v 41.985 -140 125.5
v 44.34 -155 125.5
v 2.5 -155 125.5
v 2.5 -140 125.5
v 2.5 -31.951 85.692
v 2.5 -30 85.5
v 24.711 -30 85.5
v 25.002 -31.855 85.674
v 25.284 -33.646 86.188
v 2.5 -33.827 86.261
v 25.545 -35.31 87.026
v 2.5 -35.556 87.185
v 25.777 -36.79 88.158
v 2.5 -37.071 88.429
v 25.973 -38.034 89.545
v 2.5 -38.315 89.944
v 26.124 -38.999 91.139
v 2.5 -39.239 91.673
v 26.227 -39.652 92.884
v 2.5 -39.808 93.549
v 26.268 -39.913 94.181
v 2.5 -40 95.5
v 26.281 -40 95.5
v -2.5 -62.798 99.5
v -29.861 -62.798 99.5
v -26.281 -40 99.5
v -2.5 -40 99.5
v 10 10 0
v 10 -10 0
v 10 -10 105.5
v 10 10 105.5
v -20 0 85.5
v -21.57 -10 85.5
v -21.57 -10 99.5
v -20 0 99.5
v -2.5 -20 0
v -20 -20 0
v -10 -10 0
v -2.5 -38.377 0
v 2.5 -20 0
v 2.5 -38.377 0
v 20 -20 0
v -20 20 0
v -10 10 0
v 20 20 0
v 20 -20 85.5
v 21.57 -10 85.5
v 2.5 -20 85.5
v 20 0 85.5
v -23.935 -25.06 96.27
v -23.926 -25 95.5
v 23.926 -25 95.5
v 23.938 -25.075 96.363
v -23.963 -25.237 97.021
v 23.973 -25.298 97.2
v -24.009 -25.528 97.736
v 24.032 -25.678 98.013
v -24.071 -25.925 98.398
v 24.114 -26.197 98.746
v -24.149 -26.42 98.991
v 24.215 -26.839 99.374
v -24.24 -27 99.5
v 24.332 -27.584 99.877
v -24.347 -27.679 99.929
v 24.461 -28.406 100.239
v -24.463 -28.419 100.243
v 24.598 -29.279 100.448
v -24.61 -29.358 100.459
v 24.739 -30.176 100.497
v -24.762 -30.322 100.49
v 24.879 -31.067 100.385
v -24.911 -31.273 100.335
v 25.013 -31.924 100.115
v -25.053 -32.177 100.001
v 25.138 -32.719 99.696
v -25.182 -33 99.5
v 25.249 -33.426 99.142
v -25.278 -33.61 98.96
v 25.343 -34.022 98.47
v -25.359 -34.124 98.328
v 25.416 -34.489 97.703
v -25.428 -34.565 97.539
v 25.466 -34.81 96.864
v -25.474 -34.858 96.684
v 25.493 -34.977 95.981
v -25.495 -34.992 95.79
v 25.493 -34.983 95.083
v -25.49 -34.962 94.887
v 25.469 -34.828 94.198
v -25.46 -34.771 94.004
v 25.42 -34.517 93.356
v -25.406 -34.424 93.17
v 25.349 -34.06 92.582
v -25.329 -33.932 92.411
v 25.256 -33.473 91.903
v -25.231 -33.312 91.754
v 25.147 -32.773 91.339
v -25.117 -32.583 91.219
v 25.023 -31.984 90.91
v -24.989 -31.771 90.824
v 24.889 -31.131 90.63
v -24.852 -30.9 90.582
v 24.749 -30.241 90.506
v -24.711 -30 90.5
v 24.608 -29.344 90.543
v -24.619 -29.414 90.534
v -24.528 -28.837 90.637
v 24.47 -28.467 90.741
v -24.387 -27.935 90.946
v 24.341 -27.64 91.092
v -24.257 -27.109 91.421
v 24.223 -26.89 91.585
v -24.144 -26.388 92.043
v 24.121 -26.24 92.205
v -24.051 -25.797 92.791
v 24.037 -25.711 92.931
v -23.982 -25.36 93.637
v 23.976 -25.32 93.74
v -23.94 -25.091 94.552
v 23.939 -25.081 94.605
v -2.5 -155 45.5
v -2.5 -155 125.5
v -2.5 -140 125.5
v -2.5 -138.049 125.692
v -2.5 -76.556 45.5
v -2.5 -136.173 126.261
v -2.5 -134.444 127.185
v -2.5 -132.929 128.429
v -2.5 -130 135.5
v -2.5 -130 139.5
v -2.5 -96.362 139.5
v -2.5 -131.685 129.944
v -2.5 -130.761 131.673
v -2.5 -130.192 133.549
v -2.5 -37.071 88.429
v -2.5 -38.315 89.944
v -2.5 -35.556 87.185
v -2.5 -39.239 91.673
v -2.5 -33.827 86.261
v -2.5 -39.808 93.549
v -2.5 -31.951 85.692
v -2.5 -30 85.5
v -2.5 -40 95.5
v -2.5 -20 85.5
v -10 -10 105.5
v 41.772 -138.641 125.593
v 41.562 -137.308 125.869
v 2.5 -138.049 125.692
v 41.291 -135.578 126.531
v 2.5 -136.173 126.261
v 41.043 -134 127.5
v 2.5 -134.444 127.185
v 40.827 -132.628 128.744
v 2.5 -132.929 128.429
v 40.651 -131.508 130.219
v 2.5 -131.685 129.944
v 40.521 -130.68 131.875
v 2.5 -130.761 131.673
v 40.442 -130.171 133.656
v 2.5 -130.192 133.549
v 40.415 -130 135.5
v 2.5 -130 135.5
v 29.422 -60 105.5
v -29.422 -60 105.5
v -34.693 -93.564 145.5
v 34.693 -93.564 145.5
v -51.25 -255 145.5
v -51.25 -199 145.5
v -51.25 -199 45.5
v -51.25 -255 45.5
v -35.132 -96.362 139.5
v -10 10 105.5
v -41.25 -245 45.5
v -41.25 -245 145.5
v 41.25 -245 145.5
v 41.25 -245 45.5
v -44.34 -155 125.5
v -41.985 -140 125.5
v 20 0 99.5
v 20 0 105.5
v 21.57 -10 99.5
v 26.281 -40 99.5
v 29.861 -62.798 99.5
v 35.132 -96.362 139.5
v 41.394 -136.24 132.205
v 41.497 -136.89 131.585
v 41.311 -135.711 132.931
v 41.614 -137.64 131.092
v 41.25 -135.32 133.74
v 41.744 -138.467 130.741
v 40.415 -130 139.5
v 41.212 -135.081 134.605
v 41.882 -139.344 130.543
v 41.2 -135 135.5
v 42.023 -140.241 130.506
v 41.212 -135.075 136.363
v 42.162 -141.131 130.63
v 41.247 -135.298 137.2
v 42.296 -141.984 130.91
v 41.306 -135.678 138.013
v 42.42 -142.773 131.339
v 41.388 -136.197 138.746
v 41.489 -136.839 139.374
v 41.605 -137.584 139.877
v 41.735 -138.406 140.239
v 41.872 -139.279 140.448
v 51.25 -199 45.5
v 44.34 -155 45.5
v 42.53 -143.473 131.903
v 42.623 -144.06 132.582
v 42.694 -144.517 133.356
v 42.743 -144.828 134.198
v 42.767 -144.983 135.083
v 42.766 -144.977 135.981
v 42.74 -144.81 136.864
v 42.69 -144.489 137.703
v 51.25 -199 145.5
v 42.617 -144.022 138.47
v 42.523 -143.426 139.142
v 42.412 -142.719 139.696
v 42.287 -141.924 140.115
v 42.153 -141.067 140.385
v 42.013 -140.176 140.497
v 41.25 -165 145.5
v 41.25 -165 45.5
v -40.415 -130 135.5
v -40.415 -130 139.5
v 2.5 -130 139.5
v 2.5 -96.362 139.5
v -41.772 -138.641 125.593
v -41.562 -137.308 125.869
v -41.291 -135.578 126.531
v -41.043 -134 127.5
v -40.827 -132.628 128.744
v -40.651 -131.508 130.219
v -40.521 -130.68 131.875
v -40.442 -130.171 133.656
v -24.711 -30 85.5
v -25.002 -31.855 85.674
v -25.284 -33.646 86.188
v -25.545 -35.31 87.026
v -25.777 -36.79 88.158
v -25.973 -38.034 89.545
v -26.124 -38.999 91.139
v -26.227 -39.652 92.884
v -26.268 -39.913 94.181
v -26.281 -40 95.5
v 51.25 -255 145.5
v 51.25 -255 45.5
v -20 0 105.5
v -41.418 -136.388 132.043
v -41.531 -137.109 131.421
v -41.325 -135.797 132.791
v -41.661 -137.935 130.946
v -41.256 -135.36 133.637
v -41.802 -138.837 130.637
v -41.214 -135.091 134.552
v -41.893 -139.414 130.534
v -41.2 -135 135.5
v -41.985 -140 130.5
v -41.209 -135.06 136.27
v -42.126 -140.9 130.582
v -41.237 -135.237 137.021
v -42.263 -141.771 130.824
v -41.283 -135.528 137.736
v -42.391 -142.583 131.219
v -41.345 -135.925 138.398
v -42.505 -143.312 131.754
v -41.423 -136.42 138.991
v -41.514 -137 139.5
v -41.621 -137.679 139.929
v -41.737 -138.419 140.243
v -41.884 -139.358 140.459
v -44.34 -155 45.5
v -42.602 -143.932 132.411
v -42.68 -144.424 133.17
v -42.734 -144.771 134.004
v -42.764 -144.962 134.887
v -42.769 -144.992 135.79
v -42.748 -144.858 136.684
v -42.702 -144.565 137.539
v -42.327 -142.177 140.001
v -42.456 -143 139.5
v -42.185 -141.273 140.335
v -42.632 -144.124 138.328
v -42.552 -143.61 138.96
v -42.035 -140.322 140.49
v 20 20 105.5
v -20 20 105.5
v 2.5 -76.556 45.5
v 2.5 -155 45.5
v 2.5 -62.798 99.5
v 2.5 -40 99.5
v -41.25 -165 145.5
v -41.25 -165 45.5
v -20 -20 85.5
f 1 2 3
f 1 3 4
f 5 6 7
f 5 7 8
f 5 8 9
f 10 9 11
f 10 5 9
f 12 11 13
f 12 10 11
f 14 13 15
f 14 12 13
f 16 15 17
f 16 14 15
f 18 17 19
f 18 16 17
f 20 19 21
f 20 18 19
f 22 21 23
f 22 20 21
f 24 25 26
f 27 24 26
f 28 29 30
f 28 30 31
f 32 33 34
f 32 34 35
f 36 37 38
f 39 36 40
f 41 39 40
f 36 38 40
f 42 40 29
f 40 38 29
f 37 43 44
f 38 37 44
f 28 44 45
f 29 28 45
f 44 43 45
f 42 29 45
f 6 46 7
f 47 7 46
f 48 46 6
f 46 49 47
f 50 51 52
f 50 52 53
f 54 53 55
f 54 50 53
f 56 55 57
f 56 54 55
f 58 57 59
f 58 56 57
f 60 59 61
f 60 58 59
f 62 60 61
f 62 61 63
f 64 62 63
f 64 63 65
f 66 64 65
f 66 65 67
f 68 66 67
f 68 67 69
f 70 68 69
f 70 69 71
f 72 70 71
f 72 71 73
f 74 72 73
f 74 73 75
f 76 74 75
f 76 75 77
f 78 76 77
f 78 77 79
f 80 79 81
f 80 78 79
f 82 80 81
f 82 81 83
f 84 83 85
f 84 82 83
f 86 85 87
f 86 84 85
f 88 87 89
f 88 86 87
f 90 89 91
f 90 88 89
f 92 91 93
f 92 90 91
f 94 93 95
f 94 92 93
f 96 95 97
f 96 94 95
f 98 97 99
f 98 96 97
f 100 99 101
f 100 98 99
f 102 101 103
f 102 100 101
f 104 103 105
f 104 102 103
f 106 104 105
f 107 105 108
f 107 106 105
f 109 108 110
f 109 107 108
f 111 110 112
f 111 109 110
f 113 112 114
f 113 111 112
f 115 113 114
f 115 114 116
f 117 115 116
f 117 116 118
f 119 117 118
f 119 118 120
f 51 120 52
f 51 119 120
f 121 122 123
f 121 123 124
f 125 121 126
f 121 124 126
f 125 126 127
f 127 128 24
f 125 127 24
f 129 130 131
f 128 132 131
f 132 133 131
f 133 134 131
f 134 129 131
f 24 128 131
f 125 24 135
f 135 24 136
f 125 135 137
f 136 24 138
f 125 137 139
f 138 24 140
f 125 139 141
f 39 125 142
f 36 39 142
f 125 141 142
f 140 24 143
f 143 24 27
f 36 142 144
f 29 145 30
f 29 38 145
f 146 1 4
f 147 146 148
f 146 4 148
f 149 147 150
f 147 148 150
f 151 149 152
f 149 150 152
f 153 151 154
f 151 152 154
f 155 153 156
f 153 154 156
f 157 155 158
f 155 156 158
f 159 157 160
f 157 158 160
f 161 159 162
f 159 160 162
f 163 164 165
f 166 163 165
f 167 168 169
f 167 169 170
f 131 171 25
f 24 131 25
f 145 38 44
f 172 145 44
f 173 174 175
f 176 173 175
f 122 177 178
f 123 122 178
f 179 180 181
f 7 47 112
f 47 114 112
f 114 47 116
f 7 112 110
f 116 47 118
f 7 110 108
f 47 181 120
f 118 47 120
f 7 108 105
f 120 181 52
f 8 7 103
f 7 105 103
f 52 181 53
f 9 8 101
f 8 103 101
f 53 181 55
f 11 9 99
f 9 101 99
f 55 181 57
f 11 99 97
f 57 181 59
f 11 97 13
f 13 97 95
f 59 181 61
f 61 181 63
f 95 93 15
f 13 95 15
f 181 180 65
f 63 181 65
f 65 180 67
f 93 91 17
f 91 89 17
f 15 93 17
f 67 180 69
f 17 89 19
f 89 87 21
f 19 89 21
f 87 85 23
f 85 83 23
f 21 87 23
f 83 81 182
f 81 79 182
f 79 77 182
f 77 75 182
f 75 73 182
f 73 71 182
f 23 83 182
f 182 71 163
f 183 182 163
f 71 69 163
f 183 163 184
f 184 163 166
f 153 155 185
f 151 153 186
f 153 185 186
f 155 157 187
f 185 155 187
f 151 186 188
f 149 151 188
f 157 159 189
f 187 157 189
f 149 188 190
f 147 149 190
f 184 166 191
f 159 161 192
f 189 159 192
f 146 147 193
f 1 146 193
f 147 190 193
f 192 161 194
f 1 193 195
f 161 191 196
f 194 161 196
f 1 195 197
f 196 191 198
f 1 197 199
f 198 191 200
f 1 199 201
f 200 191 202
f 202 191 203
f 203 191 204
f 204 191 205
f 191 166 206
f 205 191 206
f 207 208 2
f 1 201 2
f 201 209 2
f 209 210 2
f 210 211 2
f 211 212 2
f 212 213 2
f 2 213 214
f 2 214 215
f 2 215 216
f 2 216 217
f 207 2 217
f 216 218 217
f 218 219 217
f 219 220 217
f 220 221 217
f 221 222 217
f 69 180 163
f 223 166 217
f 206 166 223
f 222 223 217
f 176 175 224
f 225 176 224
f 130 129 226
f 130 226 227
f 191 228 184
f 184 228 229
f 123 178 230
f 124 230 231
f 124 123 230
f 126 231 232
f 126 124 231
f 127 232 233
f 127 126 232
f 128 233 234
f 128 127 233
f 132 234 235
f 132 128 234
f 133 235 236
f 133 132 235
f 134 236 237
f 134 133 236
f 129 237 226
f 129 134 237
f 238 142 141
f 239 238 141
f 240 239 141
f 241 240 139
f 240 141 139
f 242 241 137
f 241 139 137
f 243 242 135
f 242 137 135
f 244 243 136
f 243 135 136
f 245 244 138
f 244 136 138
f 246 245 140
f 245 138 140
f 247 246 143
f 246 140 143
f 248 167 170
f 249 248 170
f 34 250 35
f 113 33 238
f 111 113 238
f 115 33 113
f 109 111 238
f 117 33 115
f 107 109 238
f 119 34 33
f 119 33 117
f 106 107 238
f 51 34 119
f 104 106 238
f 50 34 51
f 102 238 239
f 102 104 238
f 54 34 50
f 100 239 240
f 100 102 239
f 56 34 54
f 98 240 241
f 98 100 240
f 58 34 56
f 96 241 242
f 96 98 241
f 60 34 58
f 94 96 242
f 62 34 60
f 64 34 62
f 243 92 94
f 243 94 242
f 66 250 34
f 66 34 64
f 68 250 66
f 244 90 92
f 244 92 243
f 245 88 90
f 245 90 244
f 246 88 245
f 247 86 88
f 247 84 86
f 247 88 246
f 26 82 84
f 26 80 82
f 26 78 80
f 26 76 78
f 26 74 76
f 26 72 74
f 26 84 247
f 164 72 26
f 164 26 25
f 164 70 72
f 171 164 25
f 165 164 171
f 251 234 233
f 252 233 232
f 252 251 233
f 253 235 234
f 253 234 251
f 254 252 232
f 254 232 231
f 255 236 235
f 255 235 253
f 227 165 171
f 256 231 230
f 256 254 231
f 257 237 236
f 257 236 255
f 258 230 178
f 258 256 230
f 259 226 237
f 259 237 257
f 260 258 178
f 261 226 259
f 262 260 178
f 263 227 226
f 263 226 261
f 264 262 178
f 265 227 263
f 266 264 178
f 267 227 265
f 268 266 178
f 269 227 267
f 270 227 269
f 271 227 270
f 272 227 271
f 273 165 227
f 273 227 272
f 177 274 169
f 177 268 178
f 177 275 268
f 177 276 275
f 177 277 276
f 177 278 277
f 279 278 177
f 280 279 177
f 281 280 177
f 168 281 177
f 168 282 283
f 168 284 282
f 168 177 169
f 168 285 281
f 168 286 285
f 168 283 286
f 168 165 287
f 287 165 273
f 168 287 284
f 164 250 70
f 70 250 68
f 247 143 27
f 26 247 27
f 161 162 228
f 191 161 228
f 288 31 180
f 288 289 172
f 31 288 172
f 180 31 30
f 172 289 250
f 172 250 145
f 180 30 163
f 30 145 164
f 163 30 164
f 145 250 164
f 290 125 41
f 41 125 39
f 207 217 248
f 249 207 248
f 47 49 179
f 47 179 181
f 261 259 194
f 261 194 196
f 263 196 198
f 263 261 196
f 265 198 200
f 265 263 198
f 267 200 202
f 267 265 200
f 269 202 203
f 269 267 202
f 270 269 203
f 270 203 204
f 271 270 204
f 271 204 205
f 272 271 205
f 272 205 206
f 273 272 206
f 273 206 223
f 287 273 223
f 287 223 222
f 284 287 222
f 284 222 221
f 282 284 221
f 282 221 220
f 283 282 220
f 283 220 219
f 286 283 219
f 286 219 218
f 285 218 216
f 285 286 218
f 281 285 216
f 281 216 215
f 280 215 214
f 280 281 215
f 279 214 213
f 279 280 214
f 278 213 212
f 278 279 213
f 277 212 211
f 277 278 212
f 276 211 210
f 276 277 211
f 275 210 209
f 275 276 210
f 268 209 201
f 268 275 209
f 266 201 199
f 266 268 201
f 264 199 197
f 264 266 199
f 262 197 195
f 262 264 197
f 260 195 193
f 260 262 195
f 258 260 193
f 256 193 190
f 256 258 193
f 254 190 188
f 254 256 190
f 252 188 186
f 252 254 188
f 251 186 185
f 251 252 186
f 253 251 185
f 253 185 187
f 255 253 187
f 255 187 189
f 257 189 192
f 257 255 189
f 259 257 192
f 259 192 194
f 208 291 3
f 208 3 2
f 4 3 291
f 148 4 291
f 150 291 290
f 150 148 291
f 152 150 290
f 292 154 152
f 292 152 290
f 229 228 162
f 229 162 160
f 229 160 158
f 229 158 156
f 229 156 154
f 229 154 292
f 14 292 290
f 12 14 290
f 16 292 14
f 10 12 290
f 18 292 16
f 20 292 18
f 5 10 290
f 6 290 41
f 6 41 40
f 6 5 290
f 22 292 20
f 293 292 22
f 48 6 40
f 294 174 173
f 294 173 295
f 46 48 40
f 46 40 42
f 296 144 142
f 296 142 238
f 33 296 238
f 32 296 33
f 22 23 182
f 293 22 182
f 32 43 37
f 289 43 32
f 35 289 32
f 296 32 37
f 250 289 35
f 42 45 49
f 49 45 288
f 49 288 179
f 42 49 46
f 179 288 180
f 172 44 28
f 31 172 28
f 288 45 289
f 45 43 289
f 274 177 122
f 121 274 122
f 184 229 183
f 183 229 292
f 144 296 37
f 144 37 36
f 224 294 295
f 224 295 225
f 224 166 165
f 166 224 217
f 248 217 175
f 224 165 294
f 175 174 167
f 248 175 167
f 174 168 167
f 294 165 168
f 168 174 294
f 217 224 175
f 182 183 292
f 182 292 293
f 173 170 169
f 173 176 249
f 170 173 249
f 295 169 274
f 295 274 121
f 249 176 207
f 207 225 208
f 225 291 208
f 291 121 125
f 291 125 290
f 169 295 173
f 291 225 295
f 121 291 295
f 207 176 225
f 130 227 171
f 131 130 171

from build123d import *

# Parameters (mm, degrees)
SKETCH1_W                = 40
SKETCH1_H                = 40
SKETCH1_W_2              = 20
SKETCH1_H_2              = 20
BOSS_EXTRUDE1_DEPTH      = 105.5
SKETCH2_W                = 102.5
SKETCH2_H                = 100
SKETCH2_W_2              = 82.5
SKETCH2_H_2              = 80
BOSS_EXTRUDE2_DEPTH      = 100
EXTRUDE_THIN1_DEPTH      = 158
EXTRUDE_THIN1_DEPTH_BACK = 166
RIB8_START               = -2.5
RIB8_DEPTH               = 5
CUT_EXTRUDE2_DEPTH       = 338.270292199
SKETCH2_2_W              = 82.5
SKETCH2_2_H              = 80
CUT_EXTRUDE3_DEPTH       = 299.029885246
SKETCH1_2_W              = 20
SKETCH1_2_H              = 20
CUT_EXTRUDE4_DEPTH       = 299.029885246
BOSS_EXTRUDE3_REACH      = 300.03
SKETCH7_R                = 5
BOSS_EXTRUDE4_REACH      = 300.03
CUT_EXTRUDE6_DEPTH       = 299.029885246
CUT_EXTRUDE6_DEPTH_BACK  = 299.029885246
SKETCH7_4_R              = 5
BOSS_EXTRUDE5_DEPTH      = 14


# Read off the part's stored shape, not the designer's step: Rib8
with BuildPart() as part:
    # Sketch1 → Boss-Extrude1 (new body)
    with BuildSketch(Plane.XY):
        Rectangle(SKETCH1_W, SKETCH1_H)
        Rectangle(SKETCH1_W_2, SKETCH1_H_2, mode=Mode.SUBTRACT)
    extrude(amount=BOSS_EXTRUDE1_DEPTH)



with BuildPart() as body_2:
    # Sketch2 → Boss-Extrude2 (new body)
    with BuildSketch(Plane.XY.offset(145.5)):
        with Locations((0, -205)):
            Rectangle(SKETCH2_W, SKETCH2_H)
        with Locations((0, -205)):
            Rectangle(SKETCH2_W_2, SKETCH2_H_2, mode=Mode.SUBTRACT)
    extrude(amount=-BOSS_EXTRUDE2_DEPTH)


with BuildPart() as part_1:
    add(part.part)

    add(body_2.part)  # Extrude-Thin1 merges body 2
    # Sketch3 → Extrude-Thin1 (add, two sides: drawn at the far end of the back side and taken through both)
    with BuildSketch(Plane(origin=(0, 0, 0), x_dir=(0, 0, -1), z_dir=(1, 0, 0)).offset(-EXTRUDE_THIN1_DEPTH_BACK)):
        Polygon((-105.5, 20), (-105.5, 0), (-105.5, -60), (-145.5, -93.563985247), (-145.5, -255), (-139.5, -255), (-139.5, -96.361831196), (-99.5, -62.797845949), (-99.5, 0), (-99.5, 20), align=None)
    extrude(amount=EXTRUDE_THIN1_DEPTH + EXTRUDE_THIN1_DEPTH_BACK)

    # Rib8 outline → Rib8 (add)
    with BuildSketch(Plane.YZ.offset(RIB8_START)):
        Polygon((-38.377112489, 0), (-20, 0), (-20, 99.5), (-62.797845949, 99.5), (-96.361831196, 139.5), (-155, 139.5), (-155, 45.5), (-76.556145708, 45.5), align=None)
    extrude(amount=RIB8_DEPTH)

    # Sketch6 → Cut-Extrude2 (cut, through all)
    with BuildSketch(Plane.XY.offset(145.5)):
        Polygon((20, 20), (20, 0), (51.25, -199), (51.25, -255), (158, -255), (158, 20), align=None)
        Polygon((-51.25, -255), (-158, -255), (-166, -255), (-166, 20), (-158, 20), (-20, 20), (-20, 0), (-51.25, -199), align=None)
    extrude(amount=-CUT_EXTRUDE2_DEPTH, mode=Mode.SUBTRACT)

    # Sketch2<2> → Cut-Extrude3 (cut, through all)
    with BuildSketch(Plane.XY.offset(145.5)):
        with Locations((0, -205)):
            Rectangle(SKETCH2_2_W, SKETCH2_2_H)
    extrude(amount=-CUT_EXTRUDE3_DEPTH, mode=Mode.SUBTRACT)

    # Sketch1<2> → Cut-Extrude4 (cut, through all)
    with BuildSketch(Plane.XY):
        Rectangle(SKETCH1_2_W, SKETCH1_2_H)
    extrude(amount=CUT_EXTRUDE4_DEPTH, mode=Mode.SUBTRACT)

    # Boss-Extrude3: up to this plane
    boss_extrude3_end = Plane(origin=(-20, 0, 0), z_dir=(-0.9878934335848292, 0.15513401909309493, 0))
    # Sketch7 → Boss-Extrude3 (add, up to the surface)
    with BuildSketch(Plane(origin=(0, 0, 0), x_dir=(0, 0, -1), z_dir=(1, 0, 0)), mode=Mode.PRIVATE) as boss_extrude3_sk1:
        with BuildLine():
            Line((-145.5, -165), (-125.5, -165))
            Line((-125.5, -165), (-125.5, -140))
            ThreePointArc((-125.5, -140), (-128.428932188, -132.928932188), (-135.5, -130))
            Line((-135.5, -130), (-145.5, -130))
            Line((-145.5, -130), (-145.5, -165))
        make_face()
        with Locations((-135.5, -140)):
            Circle(SKETCH7_R, mode=Mode.SUBTRACT)
    boss_extrude3_tool1 = split(extrude(boss_extrude3_sk1.sketch, amount=-BOSS_EXTRUDE3_REACH, mode=Mode.PRIVATE), bisect_by=boss_extrude3_end, keep=Keep.BOTH, mode=Mode.PRIVATE)
    add(boss_extrude3_tool1.solids().sort_by_distance((0, -149.027778, 135.777778))[0])
    # Sketch7 → Boss-Extrude3 (add, up to the surface)
    with BuildSketch(Plane(origin=(0, 0, 0), x_dir=(0, 0, -1), z_dir=(1, 0, 0)), mode=Mode.PRIVATE) as boss_extrude3_sk2:
        with BuildLine():
            Line((-105.5, -10), (-85.5, -10))
            Line((-85.5, -10), (-85.5, -30))
            ThreePointArc((-85.5, -30), (-88.428932188, -37.071067812), (-95.5, -40))
            Line((-95.5, -40), (-105.5, -40))
            Line((-105.5, -40), (-105.5, -10))
        make_face()
        with Locations((-95.5, -30)):
            Circle(SKETCH7_R, mode=Mode.SUBTRACT)
    boss_extrude3_tool2 = split(extrude(boss_extrude3_sk2.sketch, amount=-BOSS_EXTRUDE3_REACH, mode=Mode.PRIVATE), bisect_by=boss_extrude3_end, keep=Keep.BOTH, mode=Mode.PRIVATE)
    add(boss_extrude3_tool2.solids().sort_by_distance((0, -23.666667, 95.833333))[0])

    # Boss-Extrude4: up to this plane
    boss_extrude4_end = Plane(origin=(20, 0, 0), z_dir=(-0.9878934335848292, -0.15513401909309524, 0))
    # Sketch7<2> → Boss-Extrude4 (add, up to the surface)
    with BuildSketch(Plane(origin=(0, 0, 0), x_dir=(0, 0, -1), z_dir=(1, 0, 0)), mode=Mode.PRIVATE) as boss_extrude4_sk1:
        with BuildLine():
            Line((-145.5, -165), (-125.5, -165))
            Line((-125.5, -165), (-125.5, -140))
            ThreePointArc((-125.5, -140), (-128.428932188, -132.928932188), (-135.5, -130))
            Line((-135.5, -130), (-145.5, -130))
            Line((-145.5, -130), (-145.5, -165))
        make_face()
    boss_extrude4_tool1 = split(extrude(boss_extrude4_sk1.sketch, amount=BOSS_EXTRUDE4_REACH, mode=Mode.PRIVATE), bisect_by=boss_extrude4_end, keep=Keep.BOTH, mode=Mode.PRIVATE)
    add(boss_extrude4_tool1.solids().sort_by_distance((0, -147.982828, 135.745625))[0])
    # Sketch7<2> → Boss-Extrude4 (add, up to the surface)
    with BuildSketch(Plane(origin=(0, 0, 0), x_dir=(0, 0, -1), z_dir=(1, 0, 0)), mode=Mode.PRIVATE) as boss_extrude4_sk2:
        with BuildLine():
            Line((-105.5, -10), (-85.5, -10))
            Line((-85.5, -10), (-85.5, -30))
            ThreePointArc((-85.5, -30), (-88.428932188, -37.071067812), (-95.5, -40))
            Line((-95.5, -40), (-105.5, -40))
            Line((-105.5, -40), (-105.5, -10))
        make_face()
    boss_extrude4_tool2 = split(extrude(boss_extrude4_sk2.sketch, amount=BOSS_EXTRUDE4_REACH, mode=Mode.PRIVATE), bisect_by=boss_extrude4_end, keep=Keep.BOTH, mode=Mode.PRIVATE)
    add(boss_extrude4_tool2.solids().sort_by_distance((0, -24.52645, 95.788082))[0])

    # Sketch7<4> → Cut-Extrude6 (cut, two sides: drawn at the far end of the back side and taken through both)
    with BuildSketch(Plane(origin=(0, 0, 0), x_dir=(0, 0, -1), z_dir=(1, 0, 0)).offset(-CUT_EXTRUDE6_DEPTH_BACK)):
        with Locations(Location((-135.5, -140, 0), (0, 0, 90))):
            Circle(SKETCH7_4_R)
        with Locations(Location((-95.5, -30, 0), (0, 0, 90))):
            Circle(SKETCH7_4_R)
    extrude(amount=CUT_EXTRUDE6_DEPTH + CUT_EXTRUDE6_DEPTH_BACK, mode=Mode.SUBTRACT)

    # Sketch8 → Boss-Extrude5 (add)
    with BuildSketch(Plane(origin=(0, 0, 99.5), x_dir=(-1, 0, 0), z_dir=(0, 0, -1))):
        Polygon((20, 0), (20, -10), (21.570351759, -10), align=None)
        Polygon((-20, 0), (-21.570351759, -10), (-20, -10), align=None)
    extrude(amount=BOSS_EXTRUDE5_DEPTH)


solid = part_1.part
